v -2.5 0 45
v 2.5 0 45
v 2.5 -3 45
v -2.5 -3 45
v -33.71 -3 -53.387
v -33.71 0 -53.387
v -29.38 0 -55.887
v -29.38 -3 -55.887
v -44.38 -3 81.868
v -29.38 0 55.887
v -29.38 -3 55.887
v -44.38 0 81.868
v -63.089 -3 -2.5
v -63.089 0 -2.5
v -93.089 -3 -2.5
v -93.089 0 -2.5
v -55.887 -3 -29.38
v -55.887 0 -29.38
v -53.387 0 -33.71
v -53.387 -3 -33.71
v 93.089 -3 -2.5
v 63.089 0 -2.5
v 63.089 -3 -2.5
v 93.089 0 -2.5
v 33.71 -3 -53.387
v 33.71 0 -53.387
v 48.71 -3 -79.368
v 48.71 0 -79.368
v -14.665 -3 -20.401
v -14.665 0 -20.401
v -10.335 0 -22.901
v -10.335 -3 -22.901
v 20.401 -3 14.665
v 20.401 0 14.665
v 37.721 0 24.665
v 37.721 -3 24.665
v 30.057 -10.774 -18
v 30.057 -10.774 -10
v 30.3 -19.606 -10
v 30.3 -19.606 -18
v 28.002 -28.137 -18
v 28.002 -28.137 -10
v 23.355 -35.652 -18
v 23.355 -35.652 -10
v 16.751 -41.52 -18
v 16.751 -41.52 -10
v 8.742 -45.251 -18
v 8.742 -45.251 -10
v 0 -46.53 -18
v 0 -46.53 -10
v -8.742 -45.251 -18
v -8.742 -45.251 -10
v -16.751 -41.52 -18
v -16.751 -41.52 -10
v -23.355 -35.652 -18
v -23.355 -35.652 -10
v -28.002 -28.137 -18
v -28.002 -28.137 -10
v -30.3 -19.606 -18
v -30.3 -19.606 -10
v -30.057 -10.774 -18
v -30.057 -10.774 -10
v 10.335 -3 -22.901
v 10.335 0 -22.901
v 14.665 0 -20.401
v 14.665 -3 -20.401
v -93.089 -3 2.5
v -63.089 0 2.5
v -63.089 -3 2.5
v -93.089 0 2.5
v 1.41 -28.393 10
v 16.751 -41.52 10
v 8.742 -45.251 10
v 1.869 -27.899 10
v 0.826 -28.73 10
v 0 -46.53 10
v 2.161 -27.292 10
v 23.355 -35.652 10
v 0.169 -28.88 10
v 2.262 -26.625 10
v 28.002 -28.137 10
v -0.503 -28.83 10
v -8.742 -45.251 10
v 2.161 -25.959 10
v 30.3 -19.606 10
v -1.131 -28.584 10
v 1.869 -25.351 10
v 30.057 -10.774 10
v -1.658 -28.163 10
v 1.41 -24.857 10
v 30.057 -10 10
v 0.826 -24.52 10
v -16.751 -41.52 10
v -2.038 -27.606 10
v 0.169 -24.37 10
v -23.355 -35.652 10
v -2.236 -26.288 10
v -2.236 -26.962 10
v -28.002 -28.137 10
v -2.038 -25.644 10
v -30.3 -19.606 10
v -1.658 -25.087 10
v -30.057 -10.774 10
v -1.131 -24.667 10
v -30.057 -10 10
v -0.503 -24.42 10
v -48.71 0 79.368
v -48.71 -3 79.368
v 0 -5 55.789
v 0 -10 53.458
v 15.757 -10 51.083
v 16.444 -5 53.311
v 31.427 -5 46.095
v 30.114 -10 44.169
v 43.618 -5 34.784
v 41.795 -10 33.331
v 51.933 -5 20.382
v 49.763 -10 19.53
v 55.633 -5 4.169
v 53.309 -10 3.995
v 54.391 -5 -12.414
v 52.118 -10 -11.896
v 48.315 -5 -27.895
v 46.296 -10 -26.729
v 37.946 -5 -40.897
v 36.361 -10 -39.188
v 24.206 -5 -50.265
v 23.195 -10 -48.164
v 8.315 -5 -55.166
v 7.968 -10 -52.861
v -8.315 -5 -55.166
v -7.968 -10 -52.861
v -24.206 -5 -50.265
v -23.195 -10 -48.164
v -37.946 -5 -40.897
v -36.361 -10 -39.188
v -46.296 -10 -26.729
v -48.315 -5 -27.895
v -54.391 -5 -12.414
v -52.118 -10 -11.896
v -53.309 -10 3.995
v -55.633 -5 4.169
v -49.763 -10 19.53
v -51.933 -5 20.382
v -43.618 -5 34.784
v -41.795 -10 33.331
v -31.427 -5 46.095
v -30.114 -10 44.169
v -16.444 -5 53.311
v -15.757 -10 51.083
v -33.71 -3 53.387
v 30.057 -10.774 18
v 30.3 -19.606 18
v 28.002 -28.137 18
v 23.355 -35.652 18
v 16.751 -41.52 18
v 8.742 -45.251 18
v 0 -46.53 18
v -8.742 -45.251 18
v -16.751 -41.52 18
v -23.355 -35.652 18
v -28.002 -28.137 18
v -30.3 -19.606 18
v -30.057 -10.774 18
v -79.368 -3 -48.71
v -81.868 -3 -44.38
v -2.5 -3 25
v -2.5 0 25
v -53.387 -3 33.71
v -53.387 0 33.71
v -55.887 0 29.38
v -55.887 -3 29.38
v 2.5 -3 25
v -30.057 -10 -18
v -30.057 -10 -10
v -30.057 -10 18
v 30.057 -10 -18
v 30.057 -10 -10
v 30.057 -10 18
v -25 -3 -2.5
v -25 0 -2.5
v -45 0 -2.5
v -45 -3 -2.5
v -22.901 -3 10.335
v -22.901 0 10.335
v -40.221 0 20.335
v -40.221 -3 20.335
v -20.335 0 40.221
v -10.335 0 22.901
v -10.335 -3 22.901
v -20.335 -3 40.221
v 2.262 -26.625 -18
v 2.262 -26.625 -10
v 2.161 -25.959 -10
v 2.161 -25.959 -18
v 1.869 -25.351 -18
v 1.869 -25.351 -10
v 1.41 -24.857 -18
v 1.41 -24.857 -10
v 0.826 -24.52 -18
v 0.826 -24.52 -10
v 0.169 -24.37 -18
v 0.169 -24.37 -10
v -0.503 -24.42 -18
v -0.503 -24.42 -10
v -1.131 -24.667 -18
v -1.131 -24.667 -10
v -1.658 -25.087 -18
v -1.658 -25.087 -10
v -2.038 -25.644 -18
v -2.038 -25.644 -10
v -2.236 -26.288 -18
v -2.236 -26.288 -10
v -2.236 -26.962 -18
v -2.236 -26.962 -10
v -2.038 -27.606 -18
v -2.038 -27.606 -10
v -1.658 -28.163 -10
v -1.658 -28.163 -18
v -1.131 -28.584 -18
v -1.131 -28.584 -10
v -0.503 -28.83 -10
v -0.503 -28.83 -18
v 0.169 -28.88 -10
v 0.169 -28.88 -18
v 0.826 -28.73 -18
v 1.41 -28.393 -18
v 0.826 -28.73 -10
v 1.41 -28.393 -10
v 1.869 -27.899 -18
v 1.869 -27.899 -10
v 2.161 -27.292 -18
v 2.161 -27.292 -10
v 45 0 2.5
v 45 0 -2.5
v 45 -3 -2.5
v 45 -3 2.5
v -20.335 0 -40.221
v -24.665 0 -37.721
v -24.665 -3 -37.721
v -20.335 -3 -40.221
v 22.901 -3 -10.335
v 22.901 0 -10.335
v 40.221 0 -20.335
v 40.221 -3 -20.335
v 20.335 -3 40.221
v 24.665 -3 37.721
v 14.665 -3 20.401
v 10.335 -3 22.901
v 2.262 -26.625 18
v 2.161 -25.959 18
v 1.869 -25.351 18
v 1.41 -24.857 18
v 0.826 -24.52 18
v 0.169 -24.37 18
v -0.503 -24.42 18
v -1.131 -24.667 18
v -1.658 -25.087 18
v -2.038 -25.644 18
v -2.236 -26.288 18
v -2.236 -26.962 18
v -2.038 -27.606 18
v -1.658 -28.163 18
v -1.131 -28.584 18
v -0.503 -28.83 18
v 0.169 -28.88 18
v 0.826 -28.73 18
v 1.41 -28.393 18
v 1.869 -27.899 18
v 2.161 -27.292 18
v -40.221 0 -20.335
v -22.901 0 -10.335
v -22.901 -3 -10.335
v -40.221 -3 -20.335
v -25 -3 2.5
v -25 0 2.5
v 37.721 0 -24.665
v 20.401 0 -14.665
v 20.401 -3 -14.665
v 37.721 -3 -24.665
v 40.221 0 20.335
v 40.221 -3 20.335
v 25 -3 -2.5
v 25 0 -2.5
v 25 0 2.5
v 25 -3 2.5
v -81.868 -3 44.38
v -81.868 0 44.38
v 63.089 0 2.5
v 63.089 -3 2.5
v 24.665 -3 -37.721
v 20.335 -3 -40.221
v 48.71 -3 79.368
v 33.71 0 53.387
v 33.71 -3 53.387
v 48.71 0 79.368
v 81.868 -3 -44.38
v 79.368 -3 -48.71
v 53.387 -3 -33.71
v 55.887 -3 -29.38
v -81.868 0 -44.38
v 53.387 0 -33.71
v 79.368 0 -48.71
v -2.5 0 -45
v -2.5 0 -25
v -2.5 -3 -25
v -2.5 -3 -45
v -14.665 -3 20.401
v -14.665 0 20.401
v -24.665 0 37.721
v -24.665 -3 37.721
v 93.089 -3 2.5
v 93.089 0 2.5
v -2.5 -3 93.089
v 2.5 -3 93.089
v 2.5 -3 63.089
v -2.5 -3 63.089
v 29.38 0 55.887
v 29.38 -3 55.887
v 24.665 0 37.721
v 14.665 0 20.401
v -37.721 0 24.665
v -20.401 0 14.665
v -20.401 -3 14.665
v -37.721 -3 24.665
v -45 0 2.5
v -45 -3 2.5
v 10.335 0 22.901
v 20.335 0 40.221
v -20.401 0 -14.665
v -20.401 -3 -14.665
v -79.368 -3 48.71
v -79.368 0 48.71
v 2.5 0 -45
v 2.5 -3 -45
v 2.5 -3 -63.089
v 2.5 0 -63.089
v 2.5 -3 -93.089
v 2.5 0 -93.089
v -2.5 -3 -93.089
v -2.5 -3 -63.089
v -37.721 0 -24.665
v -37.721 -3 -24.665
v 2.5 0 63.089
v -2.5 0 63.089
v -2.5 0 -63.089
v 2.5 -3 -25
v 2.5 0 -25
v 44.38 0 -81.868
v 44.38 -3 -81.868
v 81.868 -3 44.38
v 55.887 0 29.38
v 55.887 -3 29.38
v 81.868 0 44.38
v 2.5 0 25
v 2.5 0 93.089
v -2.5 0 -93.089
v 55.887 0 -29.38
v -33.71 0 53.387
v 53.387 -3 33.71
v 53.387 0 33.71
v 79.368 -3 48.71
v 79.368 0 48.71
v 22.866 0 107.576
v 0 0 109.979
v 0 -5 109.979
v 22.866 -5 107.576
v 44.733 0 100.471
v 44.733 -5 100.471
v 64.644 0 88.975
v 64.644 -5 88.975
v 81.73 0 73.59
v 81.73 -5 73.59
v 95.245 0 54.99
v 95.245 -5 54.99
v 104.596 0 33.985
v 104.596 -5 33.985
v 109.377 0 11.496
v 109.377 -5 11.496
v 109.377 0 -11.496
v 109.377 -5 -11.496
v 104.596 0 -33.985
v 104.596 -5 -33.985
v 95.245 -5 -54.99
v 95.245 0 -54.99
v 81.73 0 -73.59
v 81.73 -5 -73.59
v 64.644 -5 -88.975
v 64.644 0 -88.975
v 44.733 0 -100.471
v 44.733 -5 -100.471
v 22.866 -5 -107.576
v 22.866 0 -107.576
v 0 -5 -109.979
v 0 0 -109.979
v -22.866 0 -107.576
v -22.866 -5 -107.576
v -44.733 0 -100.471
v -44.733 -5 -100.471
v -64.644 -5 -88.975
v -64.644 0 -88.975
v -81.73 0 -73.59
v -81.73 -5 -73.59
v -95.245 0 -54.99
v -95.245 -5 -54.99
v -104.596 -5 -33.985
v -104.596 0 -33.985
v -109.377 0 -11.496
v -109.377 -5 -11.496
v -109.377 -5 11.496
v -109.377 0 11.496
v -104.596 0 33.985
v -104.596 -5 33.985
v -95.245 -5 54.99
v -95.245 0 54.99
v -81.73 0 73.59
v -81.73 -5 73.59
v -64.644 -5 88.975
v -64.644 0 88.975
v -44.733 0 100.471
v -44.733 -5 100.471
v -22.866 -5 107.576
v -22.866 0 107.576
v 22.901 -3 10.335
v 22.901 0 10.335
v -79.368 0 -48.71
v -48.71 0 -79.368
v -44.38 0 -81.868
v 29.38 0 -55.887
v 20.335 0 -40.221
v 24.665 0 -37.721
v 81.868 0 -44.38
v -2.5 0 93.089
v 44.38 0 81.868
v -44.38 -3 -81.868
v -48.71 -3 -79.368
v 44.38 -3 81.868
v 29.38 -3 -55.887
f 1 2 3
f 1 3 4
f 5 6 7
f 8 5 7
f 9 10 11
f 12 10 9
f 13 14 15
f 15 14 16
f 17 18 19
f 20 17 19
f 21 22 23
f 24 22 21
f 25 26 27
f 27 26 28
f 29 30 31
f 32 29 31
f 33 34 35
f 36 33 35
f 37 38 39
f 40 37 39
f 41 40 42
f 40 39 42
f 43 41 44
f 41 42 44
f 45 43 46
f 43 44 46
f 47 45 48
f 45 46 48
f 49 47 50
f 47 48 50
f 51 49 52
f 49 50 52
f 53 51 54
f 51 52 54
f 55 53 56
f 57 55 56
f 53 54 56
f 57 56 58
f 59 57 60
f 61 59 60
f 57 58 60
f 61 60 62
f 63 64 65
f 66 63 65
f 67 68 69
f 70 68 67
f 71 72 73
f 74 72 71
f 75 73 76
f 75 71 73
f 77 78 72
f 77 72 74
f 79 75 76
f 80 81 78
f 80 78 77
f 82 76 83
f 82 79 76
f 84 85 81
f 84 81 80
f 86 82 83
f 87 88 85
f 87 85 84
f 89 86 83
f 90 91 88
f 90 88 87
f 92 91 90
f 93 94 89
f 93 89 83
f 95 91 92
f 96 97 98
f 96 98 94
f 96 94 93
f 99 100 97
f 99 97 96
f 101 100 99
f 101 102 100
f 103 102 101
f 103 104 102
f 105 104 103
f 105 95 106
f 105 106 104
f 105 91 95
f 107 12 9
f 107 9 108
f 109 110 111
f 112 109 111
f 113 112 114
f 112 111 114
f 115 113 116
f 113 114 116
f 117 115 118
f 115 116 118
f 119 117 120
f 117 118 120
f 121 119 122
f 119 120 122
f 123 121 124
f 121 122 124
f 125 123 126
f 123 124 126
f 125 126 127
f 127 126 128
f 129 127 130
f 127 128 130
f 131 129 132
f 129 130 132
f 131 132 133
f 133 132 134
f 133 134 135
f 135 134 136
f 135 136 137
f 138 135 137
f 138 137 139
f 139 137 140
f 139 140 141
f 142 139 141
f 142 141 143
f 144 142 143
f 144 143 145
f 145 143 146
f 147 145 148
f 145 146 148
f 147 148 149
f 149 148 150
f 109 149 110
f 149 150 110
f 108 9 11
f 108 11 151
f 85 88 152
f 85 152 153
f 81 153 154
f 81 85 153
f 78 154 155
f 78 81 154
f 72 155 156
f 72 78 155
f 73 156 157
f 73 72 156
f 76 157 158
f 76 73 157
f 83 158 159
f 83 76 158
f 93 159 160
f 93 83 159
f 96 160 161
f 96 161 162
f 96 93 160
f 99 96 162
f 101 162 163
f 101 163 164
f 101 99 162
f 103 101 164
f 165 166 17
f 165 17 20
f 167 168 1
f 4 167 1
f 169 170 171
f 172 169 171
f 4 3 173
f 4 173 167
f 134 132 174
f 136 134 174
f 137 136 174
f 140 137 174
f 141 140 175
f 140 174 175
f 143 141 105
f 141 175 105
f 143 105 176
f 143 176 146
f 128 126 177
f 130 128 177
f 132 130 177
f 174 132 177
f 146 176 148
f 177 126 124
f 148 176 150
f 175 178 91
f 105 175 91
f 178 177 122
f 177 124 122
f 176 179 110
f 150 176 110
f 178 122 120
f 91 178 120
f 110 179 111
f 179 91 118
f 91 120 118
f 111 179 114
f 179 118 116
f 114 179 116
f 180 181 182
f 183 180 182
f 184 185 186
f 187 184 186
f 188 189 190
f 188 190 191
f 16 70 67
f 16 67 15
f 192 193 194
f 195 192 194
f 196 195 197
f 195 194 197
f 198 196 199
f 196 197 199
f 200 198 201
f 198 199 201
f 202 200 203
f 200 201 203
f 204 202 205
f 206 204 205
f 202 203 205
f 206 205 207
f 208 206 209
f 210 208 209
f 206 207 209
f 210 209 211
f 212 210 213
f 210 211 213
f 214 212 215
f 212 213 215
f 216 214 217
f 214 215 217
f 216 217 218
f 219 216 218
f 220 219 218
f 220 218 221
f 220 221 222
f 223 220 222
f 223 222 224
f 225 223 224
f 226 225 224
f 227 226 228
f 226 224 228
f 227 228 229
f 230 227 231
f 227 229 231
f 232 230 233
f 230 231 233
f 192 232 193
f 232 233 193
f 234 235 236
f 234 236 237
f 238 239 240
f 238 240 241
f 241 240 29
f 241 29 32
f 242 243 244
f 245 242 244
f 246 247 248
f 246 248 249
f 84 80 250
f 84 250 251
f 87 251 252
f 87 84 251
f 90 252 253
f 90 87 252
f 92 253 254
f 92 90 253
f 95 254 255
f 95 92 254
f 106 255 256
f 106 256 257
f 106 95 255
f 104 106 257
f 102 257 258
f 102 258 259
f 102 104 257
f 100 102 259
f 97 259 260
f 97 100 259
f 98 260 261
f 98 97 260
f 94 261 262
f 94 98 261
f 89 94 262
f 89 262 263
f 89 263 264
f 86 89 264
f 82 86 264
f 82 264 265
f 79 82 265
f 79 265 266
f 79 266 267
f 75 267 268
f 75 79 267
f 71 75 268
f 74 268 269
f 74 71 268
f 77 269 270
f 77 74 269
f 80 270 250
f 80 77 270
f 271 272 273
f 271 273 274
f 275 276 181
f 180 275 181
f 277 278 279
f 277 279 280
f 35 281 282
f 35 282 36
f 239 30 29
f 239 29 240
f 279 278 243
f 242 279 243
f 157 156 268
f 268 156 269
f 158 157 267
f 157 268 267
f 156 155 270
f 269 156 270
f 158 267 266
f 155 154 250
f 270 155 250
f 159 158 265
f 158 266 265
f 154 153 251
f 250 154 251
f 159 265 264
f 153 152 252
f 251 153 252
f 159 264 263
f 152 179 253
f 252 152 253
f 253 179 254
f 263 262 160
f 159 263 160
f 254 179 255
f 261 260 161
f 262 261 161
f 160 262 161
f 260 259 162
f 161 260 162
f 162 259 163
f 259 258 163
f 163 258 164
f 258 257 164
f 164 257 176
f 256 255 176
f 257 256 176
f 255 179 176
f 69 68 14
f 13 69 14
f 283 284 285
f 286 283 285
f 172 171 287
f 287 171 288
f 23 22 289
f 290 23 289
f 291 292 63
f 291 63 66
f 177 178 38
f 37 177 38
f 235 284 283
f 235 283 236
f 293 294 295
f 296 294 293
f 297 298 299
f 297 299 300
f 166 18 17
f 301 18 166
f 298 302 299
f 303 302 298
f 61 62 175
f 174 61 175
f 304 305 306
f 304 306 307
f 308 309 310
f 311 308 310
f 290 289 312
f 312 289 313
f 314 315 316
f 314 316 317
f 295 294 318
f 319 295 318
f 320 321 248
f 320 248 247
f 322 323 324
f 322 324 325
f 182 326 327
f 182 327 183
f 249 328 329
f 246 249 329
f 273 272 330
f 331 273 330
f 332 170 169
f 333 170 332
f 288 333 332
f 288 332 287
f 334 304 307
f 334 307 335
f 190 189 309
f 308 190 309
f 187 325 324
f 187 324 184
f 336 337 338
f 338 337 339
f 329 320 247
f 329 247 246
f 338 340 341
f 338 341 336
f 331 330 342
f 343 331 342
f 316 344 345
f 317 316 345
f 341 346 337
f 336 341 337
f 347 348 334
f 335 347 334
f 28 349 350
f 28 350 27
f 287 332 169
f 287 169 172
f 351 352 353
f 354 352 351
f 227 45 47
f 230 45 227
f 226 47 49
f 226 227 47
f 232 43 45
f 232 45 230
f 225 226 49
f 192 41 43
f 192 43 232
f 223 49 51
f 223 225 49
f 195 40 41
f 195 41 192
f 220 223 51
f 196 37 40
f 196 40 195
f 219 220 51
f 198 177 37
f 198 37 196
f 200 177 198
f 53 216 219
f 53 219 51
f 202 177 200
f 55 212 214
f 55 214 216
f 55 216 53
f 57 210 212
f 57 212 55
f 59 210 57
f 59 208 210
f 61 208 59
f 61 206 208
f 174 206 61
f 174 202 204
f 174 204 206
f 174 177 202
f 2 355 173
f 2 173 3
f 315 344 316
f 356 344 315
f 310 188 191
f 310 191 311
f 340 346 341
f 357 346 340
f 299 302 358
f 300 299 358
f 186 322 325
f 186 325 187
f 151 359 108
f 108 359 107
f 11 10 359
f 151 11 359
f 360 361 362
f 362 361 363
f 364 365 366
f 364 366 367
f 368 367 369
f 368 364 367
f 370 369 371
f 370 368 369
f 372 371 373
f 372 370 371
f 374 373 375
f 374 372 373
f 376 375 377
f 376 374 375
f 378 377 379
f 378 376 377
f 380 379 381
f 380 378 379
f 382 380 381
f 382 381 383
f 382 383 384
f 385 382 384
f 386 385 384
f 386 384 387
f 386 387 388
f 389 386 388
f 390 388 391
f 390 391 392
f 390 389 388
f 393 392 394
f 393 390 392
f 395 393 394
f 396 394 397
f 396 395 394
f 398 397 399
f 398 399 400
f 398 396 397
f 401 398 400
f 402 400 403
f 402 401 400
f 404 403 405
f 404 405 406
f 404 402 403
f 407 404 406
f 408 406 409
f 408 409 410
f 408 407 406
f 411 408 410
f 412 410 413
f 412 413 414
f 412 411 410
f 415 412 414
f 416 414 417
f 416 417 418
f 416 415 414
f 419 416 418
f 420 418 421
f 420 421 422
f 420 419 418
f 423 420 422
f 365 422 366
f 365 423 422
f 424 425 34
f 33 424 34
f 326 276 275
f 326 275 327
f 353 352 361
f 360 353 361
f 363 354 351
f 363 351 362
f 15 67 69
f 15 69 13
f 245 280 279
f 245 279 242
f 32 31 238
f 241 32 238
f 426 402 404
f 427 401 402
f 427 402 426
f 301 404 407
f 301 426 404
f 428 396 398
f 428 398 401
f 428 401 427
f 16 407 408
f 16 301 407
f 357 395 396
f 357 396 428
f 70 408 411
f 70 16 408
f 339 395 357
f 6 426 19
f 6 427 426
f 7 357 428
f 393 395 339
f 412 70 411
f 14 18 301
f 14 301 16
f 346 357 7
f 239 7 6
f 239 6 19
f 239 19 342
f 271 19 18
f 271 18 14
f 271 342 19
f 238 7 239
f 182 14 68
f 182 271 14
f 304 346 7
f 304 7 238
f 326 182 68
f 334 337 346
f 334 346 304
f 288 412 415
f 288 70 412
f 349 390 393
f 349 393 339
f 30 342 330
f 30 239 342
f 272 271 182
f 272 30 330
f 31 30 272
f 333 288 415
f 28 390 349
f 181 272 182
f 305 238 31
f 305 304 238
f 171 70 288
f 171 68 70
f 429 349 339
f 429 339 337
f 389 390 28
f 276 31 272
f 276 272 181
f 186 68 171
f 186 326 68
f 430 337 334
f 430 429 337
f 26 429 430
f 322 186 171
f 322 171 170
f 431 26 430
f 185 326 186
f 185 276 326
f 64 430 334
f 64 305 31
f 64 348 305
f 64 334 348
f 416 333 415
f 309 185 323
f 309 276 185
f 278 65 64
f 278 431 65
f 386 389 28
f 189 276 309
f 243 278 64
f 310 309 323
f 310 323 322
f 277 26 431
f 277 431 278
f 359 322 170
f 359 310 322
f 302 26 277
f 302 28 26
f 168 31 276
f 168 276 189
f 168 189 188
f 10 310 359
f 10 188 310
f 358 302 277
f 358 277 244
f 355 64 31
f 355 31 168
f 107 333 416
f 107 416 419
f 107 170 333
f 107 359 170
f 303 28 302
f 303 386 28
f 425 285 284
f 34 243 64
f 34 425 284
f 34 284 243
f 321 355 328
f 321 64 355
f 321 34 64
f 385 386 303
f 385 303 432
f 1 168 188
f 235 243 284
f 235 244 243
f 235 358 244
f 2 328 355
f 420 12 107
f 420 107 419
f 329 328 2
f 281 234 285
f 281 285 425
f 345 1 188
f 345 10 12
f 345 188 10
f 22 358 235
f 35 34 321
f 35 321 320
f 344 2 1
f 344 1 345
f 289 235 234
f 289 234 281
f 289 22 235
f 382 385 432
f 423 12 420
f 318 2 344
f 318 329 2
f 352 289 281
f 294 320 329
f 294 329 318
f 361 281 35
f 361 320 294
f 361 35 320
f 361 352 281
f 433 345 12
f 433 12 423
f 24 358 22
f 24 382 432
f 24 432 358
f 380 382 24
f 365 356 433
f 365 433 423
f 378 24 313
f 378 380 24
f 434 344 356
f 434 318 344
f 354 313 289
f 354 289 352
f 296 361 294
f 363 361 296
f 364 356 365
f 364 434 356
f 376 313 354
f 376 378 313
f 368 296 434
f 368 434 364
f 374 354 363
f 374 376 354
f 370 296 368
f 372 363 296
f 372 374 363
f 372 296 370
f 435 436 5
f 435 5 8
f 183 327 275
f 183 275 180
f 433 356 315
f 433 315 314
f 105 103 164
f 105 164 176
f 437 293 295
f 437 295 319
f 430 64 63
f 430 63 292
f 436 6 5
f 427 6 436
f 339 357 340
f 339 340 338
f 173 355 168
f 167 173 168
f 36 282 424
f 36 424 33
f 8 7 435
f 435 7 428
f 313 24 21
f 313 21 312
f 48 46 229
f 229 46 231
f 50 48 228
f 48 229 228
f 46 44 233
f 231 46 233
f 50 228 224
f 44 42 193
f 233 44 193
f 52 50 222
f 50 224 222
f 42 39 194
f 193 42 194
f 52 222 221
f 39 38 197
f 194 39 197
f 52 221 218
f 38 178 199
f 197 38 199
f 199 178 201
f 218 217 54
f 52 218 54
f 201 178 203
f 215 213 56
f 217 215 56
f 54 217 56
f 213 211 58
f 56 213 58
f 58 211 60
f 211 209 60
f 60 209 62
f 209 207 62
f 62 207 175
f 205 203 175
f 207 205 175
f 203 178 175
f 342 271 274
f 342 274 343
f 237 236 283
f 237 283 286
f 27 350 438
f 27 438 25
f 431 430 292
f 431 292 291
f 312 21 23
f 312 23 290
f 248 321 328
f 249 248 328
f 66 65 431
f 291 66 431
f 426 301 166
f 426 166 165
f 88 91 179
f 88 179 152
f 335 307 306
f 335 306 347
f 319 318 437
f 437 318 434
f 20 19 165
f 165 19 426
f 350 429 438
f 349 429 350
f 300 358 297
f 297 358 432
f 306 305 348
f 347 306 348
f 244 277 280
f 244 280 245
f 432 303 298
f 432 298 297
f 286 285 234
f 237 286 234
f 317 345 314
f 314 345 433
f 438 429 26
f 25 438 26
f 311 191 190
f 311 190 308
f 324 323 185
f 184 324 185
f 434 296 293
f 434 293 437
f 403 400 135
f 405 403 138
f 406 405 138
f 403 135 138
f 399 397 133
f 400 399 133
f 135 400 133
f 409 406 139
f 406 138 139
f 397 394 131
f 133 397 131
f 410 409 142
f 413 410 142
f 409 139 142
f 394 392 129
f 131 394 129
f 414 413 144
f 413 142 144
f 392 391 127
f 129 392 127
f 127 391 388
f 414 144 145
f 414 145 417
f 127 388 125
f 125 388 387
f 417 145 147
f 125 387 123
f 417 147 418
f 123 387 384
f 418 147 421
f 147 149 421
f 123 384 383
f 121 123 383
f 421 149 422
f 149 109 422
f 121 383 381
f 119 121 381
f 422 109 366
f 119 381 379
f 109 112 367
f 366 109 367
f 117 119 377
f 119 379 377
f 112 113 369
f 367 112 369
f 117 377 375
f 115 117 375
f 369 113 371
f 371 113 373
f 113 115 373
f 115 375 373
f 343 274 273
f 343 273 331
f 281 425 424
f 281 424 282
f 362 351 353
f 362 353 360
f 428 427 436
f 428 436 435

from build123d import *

# Parameters (mm, degrees)
SKETCH1_R           = 109.979208013
SKETCH1_R_2         = 55.789490447
BOSS_EXTRUDE1_DEPTH = 5
SKETCH1_3_R         = 55.789490447
BOSS_EXTRUDE2_DEPTH = 10
SKETCH1_4_W         = 5
SKETCH1_4_H         = 20
SKETCH1_4_H_2       = 30
CUT_EXTRUDE1_DEPTH  = 3
CIRPATTERN1_COUNT   = 12
SKETCH4_R           = 2.261632511
BOSS_EXTRUDE3_DEPTH = 8
CHAMFER1_SIZE2      = 2.331538291
CHAMFER1_SIZE       = 5


with BuildPart() as part:
    # Sketch1 → Boss-Extrude1 (new body)
    with BuildSketch(Plane(origin=(0, 0, 0), x_dir=(1, 0, 0), z_dir=(0, 1, 0))):
        with Locations(Location((0, 0, 0), (0, 0, 270))):
            Circle(SKETCH1_R)
        with Locations(Location((0, 0, 0), (0, 0, 270))):
            Circle(SKETCH1_R_2, mode=Mode.SUBTRACT)
    extrude(amount=-BOSS_EXTRUDE1_DEPTH)

    # Sketch1<3> → Boss-Extrude2 (add)
    with BuildSketch(Plane(origin=(0, 0, 0), x_dir=(1, 0, 0), z_dir=(0, 1, 0))):
        with Locations(Location((0, 0, 0), (0, 0, 270))):
            Circle(SKETCH1_3_R)
    extrude(amount=-BOSS_EXTRUDE2_DEPTH)

    # Sketch1<4> → Cut-Extrude1 (cut)
    with BuildSketch(Plane(origin=(0, 0, 0), x_dir=(1, 0, 0), z_dir=(0, 1, 0))):
        with Locations((0, 35)):
            Rectangle(SKETCH1_4_W, SKETCH1_4_H)
        with Locations((0, 78.089349727)):
            Rectangle(SKETCH1_4_W, SKETCH1_4_H_2)
    cut_extrude1 = extrude(amount=-CUT_EXTRUDE1_DEPTH, mode=Mode.SUBTRACT)

    # CirPattern1: Cut-Extrude1 ×12 about axis
    cirpattern1_axis = Axis((0, 0, 0), (0, 1, 0))
    for i in range(1, CIRPATTERN1_COUNT):
        add(cut_extrude1.rotate(cirpattern1_axis, i * 360 / CIRPATTERN1_COUNT), mode=Mode.SUBTRACT)

    # Sketch4 → Boss-Extrude3 (add)
    with BuildSketch(Plane.XY.offset(10)):
        with BuildLine():
            Line((-30.05733698, -10), (30.05733698, -10))
            Line((30.05733698, -10), (30.05733698, -10.774181914))
            ThreePointArc((30.05733698, -10.774181914), (0, -46.529878203), (-30.05733698, -10.774181914))
            Line((-30.05733698, -10.774181914), (-30.05733698, -10))
        make_face()
        with Locations((0, -26.625171413)):
            Circle(SKETCH4_R, mode=Mode.SUBTRACT)
    boss_extrude3 = extrude(amount=BOSS_EXTRUDE3_DEPTH)

    # Mirror1: Boss-Extrude3 across plane
    add(boss_extrude3.mirror(Plane.XY))

    # Chamfer1
    chamfer1_edges = [part.edges().sort_by_distance(p)[0] for p in [
        (0, -10, -55.789490447),
    ]]
    chamfer1_side = [part.faces().sort_by_distance(p)[0] for p in [
        (0, -9.953369234, -55.789490447),
    ]]
    chamfer(chamfer1_edges, length=CHAMFER1_SIZE - 0.0001, length2=CHAMFER1_SIZE2 - 0.0001, reference=chamfer1_side[0])  # a hair under: the kernel refuses the full size


solid = part.part
